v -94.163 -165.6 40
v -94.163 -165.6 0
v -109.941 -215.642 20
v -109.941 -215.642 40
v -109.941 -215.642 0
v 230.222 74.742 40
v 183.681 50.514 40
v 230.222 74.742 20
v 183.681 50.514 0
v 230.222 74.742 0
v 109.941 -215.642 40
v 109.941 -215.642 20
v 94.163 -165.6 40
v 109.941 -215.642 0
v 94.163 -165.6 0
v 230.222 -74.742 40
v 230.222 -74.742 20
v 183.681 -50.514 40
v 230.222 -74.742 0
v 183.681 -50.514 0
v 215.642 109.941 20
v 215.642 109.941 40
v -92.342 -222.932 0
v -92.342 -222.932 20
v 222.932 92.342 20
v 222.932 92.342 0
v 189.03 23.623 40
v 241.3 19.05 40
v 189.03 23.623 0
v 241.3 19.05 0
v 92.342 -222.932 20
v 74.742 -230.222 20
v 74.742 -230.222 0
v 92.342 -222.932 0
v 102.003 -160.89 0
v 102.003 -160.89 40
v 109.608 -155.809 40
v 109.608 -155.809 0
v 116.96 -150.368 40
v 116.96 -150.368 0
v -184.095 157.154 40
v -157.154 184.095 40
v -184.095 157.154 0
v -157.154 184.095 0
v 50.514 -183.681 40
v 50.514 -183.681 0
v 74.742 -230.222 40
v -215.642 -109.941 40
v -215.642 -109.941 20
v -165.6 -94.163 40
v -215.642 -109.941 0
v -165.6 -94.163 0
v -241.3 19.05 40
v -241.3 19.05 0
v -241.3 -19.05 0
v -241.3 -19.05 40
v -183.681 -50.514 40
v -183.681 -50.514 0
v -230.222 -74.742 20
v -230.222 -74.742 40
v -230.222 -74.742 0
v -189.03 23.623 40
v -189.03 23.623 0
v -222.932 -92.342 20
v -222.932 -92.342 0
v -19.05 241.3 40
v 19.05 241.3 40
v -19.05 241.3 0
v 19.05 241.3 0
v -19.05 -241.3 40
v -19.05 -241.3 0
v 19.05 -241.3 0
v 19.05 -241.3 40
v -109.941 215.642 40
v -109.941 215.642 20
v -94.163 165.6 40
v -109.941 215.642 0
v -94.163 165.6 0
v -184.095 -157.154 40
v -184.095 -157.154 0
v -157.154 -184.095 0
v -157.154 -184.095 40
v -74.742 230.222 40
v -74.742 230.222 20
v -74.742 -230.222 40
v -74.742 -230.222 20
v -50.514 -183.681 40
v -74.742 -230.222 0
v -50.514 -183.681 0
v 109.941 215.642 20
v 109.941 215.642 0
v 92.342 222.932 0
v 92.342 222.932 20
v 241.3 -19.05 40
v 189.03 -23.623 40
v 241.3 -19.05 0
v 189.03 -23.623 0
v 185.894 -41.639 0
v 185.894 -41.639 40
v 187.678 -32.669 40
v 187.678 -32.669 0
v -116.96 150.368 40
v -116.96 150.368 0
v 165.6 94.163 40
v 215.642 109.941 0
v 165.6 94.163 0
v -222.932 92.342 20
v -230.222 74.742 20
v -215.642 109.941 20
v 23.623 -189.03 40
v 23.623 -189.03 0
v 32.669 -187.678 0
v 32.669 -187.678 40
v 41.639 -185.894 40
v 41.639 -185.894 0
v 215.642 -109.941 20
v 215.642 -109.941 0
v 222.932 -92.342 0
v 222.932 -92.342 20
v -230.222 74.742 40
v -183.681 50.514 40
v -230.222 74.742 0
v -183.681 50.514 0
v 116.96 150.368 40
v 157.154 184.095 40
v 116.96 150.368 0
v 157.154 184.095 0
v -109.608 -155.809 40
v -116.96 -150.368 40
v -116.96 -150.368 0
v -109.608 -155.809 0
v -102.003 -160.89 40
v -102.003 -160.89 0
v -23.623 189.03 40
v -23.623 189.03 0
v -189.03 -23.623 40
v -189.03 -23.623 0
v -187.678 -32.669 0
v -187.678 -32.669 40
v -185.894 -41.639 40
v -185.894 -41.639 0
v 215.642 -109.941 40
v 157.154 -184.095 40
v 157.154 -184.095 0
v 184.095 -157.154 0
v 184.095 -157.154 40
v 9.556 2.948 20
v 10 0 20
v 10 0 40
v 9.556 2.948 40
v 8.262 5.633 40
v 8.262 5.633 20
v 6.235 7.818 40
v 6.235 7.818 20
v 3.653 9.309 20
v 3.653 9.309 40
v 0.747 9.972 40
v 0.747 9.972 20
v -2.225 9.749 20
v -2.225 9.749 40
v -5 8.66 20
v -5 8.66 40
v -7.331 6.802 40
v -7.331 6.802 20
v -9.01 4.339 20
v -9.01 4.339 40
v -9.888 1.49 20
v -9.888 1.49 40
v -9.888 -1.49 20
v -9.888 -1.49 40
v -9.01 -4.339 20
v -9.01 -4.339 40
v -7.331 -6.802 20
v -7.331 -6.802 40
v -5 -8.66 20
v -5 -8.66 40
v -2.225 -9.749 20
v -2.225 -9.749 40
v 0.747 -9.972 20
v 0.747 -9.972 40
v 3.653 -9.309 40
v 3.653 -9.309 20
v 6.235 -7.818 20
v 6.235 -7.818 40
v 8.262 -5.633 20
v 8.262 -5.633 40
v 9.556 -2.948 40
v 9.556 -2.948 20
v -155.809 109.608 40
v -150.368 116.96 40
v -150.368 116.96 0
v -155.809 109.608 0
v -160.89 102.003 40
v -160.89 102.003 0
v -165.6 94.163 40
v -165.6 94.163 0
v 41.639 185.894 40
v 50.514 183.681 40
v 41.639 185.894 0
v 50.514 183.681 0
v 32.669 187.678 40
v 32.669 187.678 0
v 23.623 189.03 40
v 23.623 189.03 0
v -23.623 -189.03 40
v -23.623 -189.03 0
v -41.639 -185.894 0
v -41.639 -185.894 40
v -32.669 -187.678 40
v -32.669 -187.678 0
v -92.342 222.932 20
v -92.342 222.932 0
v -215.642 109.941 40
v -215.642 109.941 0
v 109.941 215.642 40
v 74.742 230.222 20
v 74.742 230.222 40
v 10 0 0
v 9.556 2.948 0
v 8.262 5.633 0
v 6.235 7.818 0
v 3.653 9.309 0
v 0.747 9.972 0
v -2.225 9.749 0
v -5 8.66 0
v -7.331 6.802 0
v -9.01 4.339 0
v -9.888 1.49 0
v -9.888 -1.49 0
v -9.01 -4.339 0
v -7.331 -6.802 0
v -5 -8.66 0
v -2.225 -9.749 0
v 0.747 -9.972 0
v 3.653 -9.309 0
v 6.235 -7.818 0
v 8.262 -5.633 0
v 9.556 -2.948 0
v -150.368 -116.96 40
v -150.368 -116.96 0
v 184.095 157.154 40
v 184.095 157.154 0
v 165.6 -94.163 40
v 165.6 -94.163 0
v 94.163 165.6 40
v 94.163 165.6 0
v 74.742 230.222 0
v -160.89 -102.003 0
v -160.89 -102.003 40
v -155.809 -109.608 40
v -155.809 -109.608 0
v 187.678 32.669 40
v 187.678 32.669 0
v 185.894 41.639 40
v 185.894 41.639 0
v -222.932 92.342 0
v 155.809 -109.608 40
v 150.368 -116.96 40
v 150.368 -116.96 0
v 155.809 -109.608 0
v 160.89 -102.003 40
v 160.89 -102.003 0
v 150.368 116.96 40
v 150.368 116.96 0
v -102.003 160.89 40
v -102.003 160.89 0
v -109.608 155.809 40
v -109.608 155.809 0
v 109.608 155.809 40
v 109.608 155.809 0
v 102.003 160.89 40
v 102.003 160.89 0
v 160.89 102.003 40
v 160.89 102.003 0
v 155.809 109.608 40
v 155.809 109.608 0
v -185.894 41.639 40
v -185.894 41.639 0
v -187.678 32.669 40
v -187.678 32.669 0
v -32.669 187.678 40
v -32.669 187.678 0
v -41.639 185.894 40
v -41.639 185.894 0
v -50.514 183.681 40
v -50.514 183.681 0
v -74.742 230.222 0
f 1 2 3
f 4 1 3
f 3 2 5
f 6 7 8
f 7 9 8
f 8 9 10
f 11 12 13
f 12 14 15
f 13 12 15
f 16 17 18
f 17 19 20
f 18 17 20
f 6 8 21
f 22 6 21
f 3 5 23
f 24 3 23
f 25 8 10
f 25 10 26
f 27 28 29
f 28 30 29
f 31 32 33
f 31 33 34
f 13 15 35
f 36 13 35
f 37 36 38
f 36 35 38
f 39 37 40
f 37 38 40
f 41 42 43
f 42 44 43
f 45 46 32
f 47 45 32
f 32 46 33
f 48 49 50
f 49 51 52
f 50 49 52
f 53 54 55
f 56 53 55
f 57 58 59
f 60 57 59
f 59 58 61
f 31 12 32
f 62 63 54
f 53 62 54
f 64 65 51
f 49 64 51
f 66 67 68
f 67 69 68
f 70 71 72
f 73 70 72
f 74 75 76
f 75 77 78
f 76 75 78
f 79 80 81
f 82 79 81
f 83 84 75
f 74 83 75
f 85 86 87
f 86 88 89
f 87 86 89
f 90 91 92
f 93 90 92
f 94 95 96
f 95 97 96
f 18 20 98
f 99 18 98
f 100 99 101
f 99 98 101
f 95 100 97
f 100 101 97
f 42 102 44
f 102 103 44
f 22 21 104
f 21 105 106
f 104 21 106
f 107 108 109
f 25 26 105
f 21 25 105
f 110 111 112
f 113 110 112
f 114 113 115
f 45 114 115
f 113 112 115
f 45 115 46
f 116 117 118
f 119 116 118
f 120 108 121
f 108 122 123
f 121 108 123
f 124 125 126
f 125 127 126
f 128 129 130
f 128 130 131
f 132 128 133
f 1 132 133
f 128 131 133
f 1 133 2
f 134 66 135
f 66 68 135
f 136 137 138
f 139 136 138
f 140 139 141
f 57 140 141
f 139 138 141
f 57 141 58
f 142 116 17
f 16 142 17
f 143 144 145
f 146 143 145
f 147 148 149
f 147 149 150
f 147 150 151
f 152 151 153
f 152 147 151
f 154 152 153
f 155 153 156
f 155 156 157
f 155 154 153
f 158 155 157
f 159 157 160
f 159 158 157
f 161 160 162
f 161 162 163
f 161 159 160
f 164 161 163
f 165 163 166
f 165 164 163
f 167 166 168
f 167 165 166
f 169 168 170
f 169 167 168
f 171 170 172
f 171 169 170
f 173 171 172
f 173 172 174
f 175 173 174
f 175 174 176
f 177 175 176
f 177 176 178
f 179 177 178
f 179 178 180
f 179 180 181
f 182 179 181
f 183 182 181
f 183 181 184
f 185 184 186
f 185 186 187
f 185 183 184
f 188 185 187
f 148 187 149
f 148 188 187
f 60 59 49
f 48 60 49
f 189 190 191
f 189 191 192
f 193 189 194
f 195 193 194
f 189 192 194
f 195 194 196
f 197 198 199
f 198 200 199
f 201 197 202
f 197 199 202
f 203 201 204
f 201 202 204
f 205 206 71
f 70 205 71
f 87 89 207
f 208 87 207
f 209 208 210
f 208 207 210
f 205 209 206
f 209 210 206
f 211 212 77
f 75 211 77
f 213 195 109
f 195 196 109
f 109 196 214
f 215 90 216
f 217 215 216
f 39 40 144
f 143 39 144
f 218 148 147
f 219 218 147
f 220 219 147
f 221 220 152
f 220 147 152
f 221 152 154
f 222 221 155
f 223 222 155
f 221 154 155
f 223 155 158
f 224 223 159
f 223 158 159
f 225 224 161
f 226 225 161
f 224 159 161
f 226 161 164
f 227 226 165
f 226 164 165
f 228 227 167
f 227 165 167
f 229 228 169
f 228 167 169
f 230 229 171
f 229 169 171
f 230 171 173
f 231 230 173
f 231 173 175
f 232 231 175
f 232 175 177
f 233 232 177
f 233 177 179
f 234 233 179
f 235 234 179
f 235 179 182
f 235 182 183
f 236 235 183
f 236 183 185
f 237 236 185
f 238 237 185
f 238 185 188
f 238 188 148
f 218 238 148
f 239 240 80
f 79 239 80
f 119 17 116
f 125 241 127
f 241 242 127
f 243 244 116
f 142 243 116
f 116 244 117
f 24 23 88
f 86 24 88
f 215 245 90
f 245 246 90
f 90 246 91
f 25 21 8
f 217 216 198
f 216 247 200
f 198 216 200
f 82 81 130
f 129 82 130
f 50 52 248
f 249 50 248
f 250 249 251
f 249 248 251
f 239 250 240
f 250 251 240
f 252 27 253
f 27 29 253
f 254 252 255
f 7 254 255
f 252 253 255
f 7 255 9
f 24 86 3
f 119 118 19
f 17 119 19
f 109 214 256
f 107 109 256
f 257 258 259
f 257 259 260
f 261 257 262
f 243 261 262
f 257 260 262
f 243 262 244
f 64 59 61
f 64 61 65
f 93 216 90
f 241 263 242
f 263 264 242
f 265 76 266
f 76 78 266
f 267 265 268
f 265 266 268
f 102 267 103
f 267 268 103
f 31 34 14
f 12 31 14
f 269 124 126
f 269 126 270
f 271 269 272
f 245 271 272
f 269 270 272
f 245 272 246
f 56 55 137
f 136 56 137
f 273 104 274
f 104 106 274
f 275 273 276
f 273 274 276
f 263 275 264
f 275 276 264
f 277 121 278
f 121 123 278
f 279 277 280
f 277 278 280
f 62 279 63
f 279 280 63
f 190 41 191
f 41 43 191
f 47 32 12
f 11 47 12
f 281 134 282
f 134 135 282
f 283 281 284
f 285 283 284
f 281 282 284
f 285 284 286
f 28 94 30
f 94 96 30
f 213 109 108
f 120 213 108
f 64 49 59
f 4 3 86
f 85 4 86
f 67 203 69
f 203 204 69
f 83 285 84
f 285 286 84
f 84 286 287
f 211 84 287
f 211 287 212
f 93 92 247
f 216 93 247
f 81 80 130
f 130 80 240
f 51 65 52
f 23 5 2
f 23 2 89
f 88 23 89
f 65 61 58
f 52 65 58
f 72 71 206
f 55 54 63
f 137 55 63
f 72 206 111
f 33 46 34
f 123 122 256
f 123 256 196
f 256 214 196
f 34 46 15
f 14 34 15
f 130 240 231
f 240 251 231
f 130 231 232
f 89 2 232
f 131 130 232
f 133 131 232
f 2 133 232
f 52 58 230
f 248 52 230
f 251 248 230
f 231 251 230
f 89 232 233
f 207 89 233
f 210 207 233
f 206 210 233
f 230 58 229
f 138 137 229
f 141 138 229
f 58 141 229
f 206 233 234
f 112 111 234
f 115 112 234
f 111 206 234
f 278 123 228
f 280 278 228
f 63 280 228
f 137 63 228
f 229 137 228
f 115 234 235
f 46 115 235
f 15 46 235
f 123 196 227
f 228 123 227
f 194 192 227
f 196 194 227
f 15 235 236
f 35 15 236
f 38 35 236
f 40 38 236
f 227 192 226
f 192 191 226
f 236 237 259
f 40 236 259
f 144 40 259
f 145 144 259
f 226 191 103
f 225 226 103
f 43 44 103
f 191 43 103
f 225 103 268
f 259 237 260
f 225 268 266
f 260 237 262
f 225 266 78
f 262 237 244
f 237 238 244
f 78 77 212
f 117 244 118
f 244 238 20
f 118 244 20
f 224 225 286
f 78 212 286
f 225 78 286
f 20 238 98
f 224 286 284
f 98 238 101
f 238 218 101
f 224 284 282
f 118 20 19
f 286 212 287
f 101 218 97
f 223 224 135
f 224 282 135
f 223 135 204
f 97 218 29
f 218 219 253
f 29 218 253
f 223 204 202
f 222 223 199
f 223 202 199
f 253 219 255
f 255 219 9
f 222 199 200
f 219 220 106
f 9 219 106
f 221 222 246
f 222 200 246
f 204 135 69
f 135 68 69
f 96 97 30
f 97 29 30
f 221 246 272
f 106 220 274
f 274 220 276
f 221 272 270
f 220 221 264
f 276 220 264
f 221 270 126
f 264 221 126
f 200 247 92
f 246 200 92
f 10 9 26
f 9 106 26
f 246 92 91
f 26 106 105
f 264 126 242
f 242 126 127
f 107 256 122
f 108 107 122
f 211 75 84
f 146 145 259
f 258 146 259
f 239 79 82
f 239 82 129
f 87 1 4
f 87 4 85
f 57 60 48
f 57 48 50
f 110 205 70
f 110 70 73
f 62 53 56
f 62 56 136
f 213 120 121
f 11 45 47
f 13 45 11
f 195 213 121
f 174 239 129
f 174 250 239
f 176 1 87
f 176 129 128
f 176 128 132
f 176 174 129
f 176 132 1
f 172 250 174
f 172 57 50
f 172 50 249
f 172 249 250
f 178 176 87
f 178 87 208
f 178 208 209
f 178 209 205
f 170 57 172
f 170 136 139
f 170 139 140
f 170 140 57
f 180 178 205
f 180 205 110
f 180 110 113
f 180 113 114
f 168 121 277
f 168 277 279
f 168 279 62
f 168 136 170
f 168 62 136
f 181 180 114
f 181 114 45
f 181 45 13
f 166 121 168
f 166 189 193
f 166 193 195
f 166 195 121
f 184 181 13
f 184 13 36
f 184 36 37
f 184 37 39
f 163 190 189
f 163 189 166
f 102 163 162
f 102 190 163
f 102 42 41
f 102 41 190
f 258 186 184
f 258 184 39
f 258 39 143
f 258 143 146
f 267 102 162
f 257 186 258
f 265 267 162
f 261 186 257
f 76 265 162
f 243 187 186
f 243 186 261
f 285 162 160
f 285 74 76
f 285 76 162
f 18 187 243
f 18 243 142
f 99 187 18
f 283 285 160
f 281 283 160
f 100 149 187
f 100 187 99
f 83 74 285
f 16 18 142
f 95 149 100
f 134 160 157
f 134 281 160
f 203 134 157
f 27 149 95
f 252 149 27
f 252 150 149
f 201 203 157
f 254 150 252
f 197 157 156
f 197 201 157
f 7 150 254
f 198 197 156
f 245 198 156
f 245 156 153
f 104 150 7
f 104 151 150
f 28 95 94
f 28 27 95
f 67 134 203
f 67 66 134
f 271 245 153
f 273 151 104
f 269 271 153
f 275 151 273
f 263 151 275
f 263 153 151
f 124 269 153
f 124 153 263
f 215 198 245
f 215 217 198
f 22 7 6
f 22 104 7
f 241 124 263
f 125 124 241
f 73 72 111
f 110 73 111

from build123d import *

# Parameters (mm, degrees)
F1_DEPTH  = 20
F2_R      = 10
F3_DEPTH  = 20.001
F1_FACE_R = 10
F4_DEPTH  = 20


with BuildPart() as f1:
    # F0 (on Top) → F1 (new body)
    with BuildSketch(Plane.XY):
        with BuildLine():
            ThreePointArc((189.029629, -23.623065), (190.132052, -11.83439), (190.5, 0))
            ThreePointArc((190.5, 0), (190.132052, 11.83439), (189.029629, 23.623065))
            ThreePointArc((189.029629, 23.623065), (186.839596, 37.164706), (183.680761, 50.513641))
            ThreePointArc((183.680761, 50.513641), (175.999051, 72.901194), (165.60045, 94.163374))
            ThreePointArc((165.60045, 94.163374), (158.394961, 105.836129), (150.368162, 116.960103))
            ThreePointArc((150.368162, 116.960103), (134.703842, 134.703842), (116.960103, 150.368162))
            ThreePointArc((116.960103, 150.368162), (105.836129, 158.394961), (94.163374, 165.60045))
            ThreePointArc((94.163374, 165.60045), (72.901194, 175.999051), (50.513641, 183.680761))
            ThreePointArc((50.513641, 183.680761), (37.164706, 186.839596), (23.623065, 189.029629))
            ThreePointArc((23.623065, 189.029629), (0, 190.5), (-23.623065, 189.029629))
            ThreePointArc((-23.623065, 189.029629), (-37.164706, 186.839596), (-50.513641, 183.680761))
            ThreePointArc((-50.513641, 183.680761), (-72.901194, 175.999051), (-94.163374, 165.60045))
            ThreePointArc((-94.163374, 165.60045), (-105.836129, 158.394961), (-116.960103, 150.368162))
            ThreePointArc((-116.960103, 150.368162), (-134.703842, 134.703842), (-150.368162, 116.960103))
            ThreePointArc((-150.368162, 116.960103), (-158.394961, 105.836129), (-165.60045, 94.163374))
            ThreePointArc((-165.60045, 94.163374), (-175.999051, 72.901194), (-183.680761, 50.513641))
            ThreePointArc((-183.680761, 50.513641), (-186.839596, 37.164706), (-189.029629, 23.623065))
            ThreePointArc((-189.029629, 23.623065), (-190.5, 0), (-189.029629, -23.623065))
            ThreePointArc((-189.029629, -23.623065), (-186.839596, -37.164706), (-183.680761, -50.513641))
            ThreePointArc((-183.680761, -50.513641), (-175.999051, -72.901194), (-165.60045, -94.163374))
            ThreePointArc((-165.60045, -94.163374), (-158.394961, -105.836129), (-150.368162, -116.960103))
            ThreePointArc((-150.368162, -116.960103), (-134.703842, -134.703842), (-116.960103, -150.368162))
            ThreePointArc((-116.960103, -150.368162), (-105.836129, -158.394961), (-94.163374, -165.60045))
            ThreePointArc((-94.163374, -165.60045), (-72.901194, -175.999051), (-50.513641, -183.680761))
            ThreePointArc((-50.513641, -183.680761), (-37.164706, -186.839596), (-23.623065, -189.029629))
            ThreePointArc((-23.623065, -189.029629), (0, -190.5), (23.623065, -189.029629))
            ThreePointArc((23.623065, -189.029629), (37.164706, -186.839596), (50.513641, -183.680761))
            ThreePointArc((50.513641, -183.680761), (72.901194, -175.999051), (94.163374, -165.60045))
            ThreePointArc((94.163374, -165.60045), (105.836129, -158.394961), (116.960103, -150.368162))
            ThreePointArc((116.960103, -150.368162), (134.703842, -134.703842), (150.368162, -116.960103))
            ThreePointArc((150.368162, -116.960103), (158.394961, -105.836129), (165.60045, -94.163374))
            ThreePointArc((165.60045, -94.163374), (175.999051, -72.901194), (183.680761, -50.513641))
            ThreePointArc((183.680761, -50.513641), (186.839596, -37.164706), (189.029629, -23.623065))
        make_face()
        with BuildLine():
            ThreePointArc((189.029629, 23.623065), (190.132052, 11.83439), (190.5, 0))
            ThreePointArc((190.5, 0), (190.132052, -11.83439), (189.029629, -23.623065))
            Line((189.029629, -23.623065), (241.3, -19.05))
            Line((241.3, -19.05), (241.3, 0))
            Line((241.3, 0), (241.3, 19.05))
            Line((241.3, 19.05), (189.029629, 23.623065))
        make_face()
        with BuildLine():
            ThreePointArc((165.60045, 94.163374), (175.999051, 72.901194), (183.680761, 50.513641))
            Line((183.680761, 50.513641), (230.222251, 74.741607))
            Line((230.222251, 74.741607), (222.932131, 92.341512))
            Line((222.932131, 92.341512), (215.642012, 109.941417))
            Line((215.642012, 109.941417), (165.60045, 94.163374))
        make_face()
        with BuildLine():
            Line((230.222251, -74.741607), (183.680761, -50.513641))
            ThreePointArc((183.680761, -50.513641), (175.999051, -72.901194), (165.60045, -94.163374))
            Line((165.60045, -94.163374), (215.642012, -109.941417))
            Line((215.642012, -109.941417), (222.932131, -92.341512))
            Line((222.932131, -92.341512), (230.222251, -74.741607))
        make_face()
        with BuildLine():
            ThreePointArc((116.960103, 150.368162), (134.703842, 134.703842), (150.368162, 116.960103))
            Line((150.368162, 116.960103), (184.09525, 157.154482))
            Line((184.09525, 157.154482), (170.624866, 170.624866))
            Line((170.624866, 170.624866), (157.154482, 184.09525))
            Line((157.154482, 184.09525), (116.960103, 150.368162))
        make_face()
        with BuildLine():
            Line((184.09525, -157.154482), (150.368162, -116.960103))
            ThreePointArc((150.368162, -116.960103), (134.703842, -134.703842), (116.960103, -150.368162))
            Line((116.960103, -150.368162), (157.154482, -184.09525))
            Line((157.154482, -184.09525), (170.624866, -170.624866))
            Line((170.624866, -170.624866), (184.09525, -157.154482))
        make_face()
        with BuildLine():
            ThreePointArc((50.513641, 183.680761), (72.901194, 175.999051), (94.163374, 165.60045))
            Line((94.163374, 165.60045), (109.941417, 215.642012))
            Line((109.941417, 215.642012), (92.341512, 222.932131))
            Line((92.341512, 222.932131), (74.741607, 230.222251))
            Line((74.741607, 230.222251), (50.513641, 183.680761))
        make_face()
        with BuildLine():
            Line((109.941417, -215.642012), (94.163374, -165.60045))
            ThreePointArc((94.163374, -165.60045), (72.901194, -175.999051), (50.513641, -183.680761))
            Line((50.513641, -183.680761), (74.741607, -230.222251))
            Line((74.741607, -230.222251), (92.341512, -222.932131))
            Line((92.341512, -222.932131), (109.941417, -215.642012))
        make_face()
        with BuildLine():
            ThreePointArc((-23.623065, 189.029629), (0, 190.5), (23.623065, 189.029629))
            Line((23.623065, 189.029629), (19.05, 241.3))
            Line((19.05, 241.3), (0, 241.3))
            Line((0, 241.3), (-19.05, 241.3))
            Line((-19.05, 241.3), (-23.623065, 189.029629))
        make_face()
        with BuildLine():
            Line((19.05, -241.3), (23.623065, -189.029629))
            ThreePointArc((23.623065, -189.029629), (0, -190.5), (-23.623065, -189.029629))
            Line((-23.623065, -189.029629), (-19.05, -241.3))
            Line((-19.05, -241.3), (0, -241.3))
            Line((0, -241.3), (19.05, -241.3))
        make_face()
        with BuildLine():
            ThreePointArc((-94.163374, 165.60045), (-72.901194, 175.999051), (-50.513641, 183.680761))
            Line((-50.513641, 183.680761), (-74.741607, 230.222251))
            Line((-74.741607, 230.222251), (-92.341512, 222.932131))
            Line((-92.341512, 222.932131), (-109.941417, 215.642012))
            Line((-109.941417, 215.642012), (-94.163374, 165.60045))
        make_face()
        with BuildLine():
            Line((-74.741607, -230.222251), (-50.513641, -183.680761))
            ThreePointArc((-50.513641, -183.680761), (-72.901194, -175.999051), (-94.163374, -165.60045))
            Line((-94.163374, -165.60045), (-109.941417, -215.642012))
            Line((-109.941417, -215.642012), (-92.341512, -222.932131))
            Line((-92.341512, -222.932131), (-74.741607, -230.222251))
        make_face()
        with BuildLine():
            ThreePointArc((-150.368162, 116.960103), (-134.703842, 134.703842), (-116.960103, 150.368162))
            Line((-116.960103, 150.368162), (-157.154482, 184.09525))
            Line((-157.154482, 184.09525), (-170.624866, 170.624866))
            Line((-170.624866, 170.624866), (-184.09525, 157.154482))
            Line((-184.09525, 157.154482), (-150.368162, 116.960103))
        make_face()
        with BuildLine():
            Line((-157.154482, -184.09525), (-116.960103, -150.368162))
            ThreePointArc((-116.960103, -150.368162), (-134.703842, -134.703842), (-150.368162, -116.960103))
            Line((-150.368162, -116.960103), (-184.09525, -157.154482))
            Line((-184.09525, -157.154482), (-170.624866, -170.624866))
            Line((-170.624866, -170.624866), (-157.154482, -184.09525))
        make_face()
        with BuildLine():
            ThreePointArc((-183.680761, 50.513641), (-175.999051, 72.901194), (-165.60045, 94.163374))
            Line((-165.60045, 94.163374), (-215.642012, 109.941417))
            Line((-215.642012, 109.941417), (-222.932131, 92.341512))
            Line((-222.932131, 92.341512), (-230.222251, 74.741607))
            Line((-230.222251, 74.741607), (-183.680761, 50.513641))
        make_face()
        with BuildLine():
            Line((-215.642012, -109.941417), (-165.60045, -94.163374))
            ThreePointArc((-165.60045, -94.163374), (-175.999051, -72.901194), (-183.680761, -50.513641))
            Line((-183.680761, -50.513641), (-230.222251, -74.741607))
            Line((-230.222251, -74.741607), (-222.932131, -92.341512))
            Line((-222.932131, -92.341512), (-215.642012, -109.941417))
        make_face()
        with BuildLine():
            ThreePointArc((-189.029629, -23.623065), (-190.5, 0), (-189.029629, 23.623065))
            Line((-189.029629, 23.623065), (-241.3, 19.05))
            Line((-241.3, 19.05), (-241.3, 0))
            Line((-241.3, 0), (-241.3, -19.05))
            Line((-241.3, -19.05), (-189.029629, -23.623065))
        make_face()
    extrude(amount=F1_DEPTH)

    # F2 (on face) → F3 (cut, through all)
    with BuildSketch(Plane.XY.offset(20)):
        Circle(F2_R)
    extrude(amount=-F3_DEPTH, mode=Mode.SUBTRACT)

    # F1_face (on face) → F4 (join)
    with BuildSketch(Plane.XY.offset(20)):
        with BuildLine():
            ThreePointArc((183.680761, -50.513641), (186.839596, -37.164706), (189.029629, -23.623065))
            Line((189.029629, -23.623065), (241.3, -19.05))
            Line((241.3, -19.05), (241.3, 19.05))
            Line((241.3, 19.05), (189.029629, 23.623065))
            ThreePointArc((189.029629, 23.623065), (186.839596, 37.164706), (183.680761, 50.513641))
            Line((183.680761, 50.513641), (230.222251, 74.741607))
            Line((230.222251, 74.741607), (215.642012, 109.941417))
            Line((215.642012, 109.941417), (165.60045, 94.163374))
            ThreePointArc((165.60045, 94.163374), (158.394961, 105.836129), (150.368162, 116.960103))
            Line((150.368162, 116.960103), (184.09525, 157.154482))
            Line((184.09525, 157.154482), (157.154482, 184.09525))
            Line((157.154482, 184.09525), (116.960103, 150.368162))
            ThreePointArc((116.960103, 150.368162), (105.836129, 158.394961), (94.163374, 165.60045))
            Line((94.163374, 165.60045), (109.941417, 215.642012))
            Line((109.941417, 215.642012), (74.741607, 230.222251))
            Line((74.741607, 230.222251), (50.513641, 183.680761))
            ThreePointArc((50.513641, 183.680761), (37.164706, 186.839596), (23.623065, 189.029629))
            Line((23.623065, 189.029629), (19.05, 241.3))
            Line((19.05, 241.3), (-19.05, 241.3))
            Line((-19.05, 241.3), (-23.623065, 189.029629))
            ThreePointArc((-23.623065, 189.029629), (-37.164706, 186.839596), (-50.513641, 183.680761))
            Line((-50.513641, 183.680761), (-74.741607, 230.222251))
            Line((-74.741607, 230.222251), (-109.941417, 215.642012))
            Line((-109.941417, 215.642012), (-94.163374, 165.60045))
            ThreePointArc((-94.163374, 165.60045), (-105.836129, 158.394961), (-116.960103, 150.368162))
            Line((-116.960103, 150.368162), (-157.154482, 184.09525))
            Line((-157.154482, 184.09525), (-184.09525, 157.154482))
            Line((-184.09525, 157.154482), (-150.368162, 116.960103))
            ThreePointArc((-150.368162, 116.960103), (-158.394961, 105.836129), (-165.60045, 94.163374))
            Line((-165.60045, 94.163374), (-215.642012, 109.941417))
            Line((-215.642012, 109.941417), (-230.222251, 74.741607))
            Line((-230.222251, 74.741607), (-183.680761, 50.513641))
            ThreePointArc((-183.680761, 50.513641), (-186.839596, 37.164706), (-189.029629, 23.623065))
            Line((-189.029629, 23.623065), (-241.3, 19.05))
            Line((-241.3, 19.05), (-241.3, -19.05))
            Line((-241.3, -19.05), (-189.029629, -23.623065))
            ThreePointArc((-189.029629, -23.623065), (-186.839596, -37.164706), (-183.680761, -50.513641))
            Line((-183.680761, -50.513641), (-230.222251, -74.741607))
            Line((-230.222251, -74.741607), (-215.642012, -109.941417))
            Line((-215.642012, -109.941417), (-165.60045, -94.163374))
            ThreePointArc((-165.60045, -94.163374), (-158.394961, -105.836129), (-150.368162, -116.960103))
            Line((-150.368162, -116.960103), (-184.09525, -157.154482))
            Line((-184.09525, -157.154482), (-157.154482, -184.09525))
            Line((-157.154482, -184.09525), (-116.960103, -150.368162))
            ThreePointArc((-116.960103, -150.368162), (-105.836129, -158.394961), (-94.163374, -165.60045))
            Line((-94.163374, -165.60045), (-109.941417, -215.642012))
            Line((-109.941417, -215.642012), (-74.741607, -230.222251))
            Line((-74.741607, -230.222251), (-50.513641, -183.680761))
            ThreePointArc((-50.513641, -183.680761), (-37.164706, -186.839596), (-23.623065, -189.029629))
            Line((-23.623065, -189.029629), (-19.05, -241.3))
            Line((-19.05, -241.3), (19.05, -241.3))
            Line((19.05, -241.3), (23.623065, -189.029629))
            ThreePointArc((23.623065, -189.029629), (37.164706, -186.839596), (50.513641, -183.680761))
            Line((50.513641, -183.680761), (74.741607, -230.222251))
            Line((74.741607, -230.222251), (109.941417, -215.642012))
            Line((109.941417, -215.642012), (94.163374, -165.60045))
            ThreePointArc((94.163374, -165.60045), (105.836129, -158.394961), (116.960103, -150.368162))
            Line((116.960103, -150.368162), (157.154482, -184.09525))
            Line((157.154482, -184.09525), (184.09525, -157.154482))
            Line((184.09525, -157.154482), (150.368162, -116.960103))
            ThreePointArc((150.368162, -116.960103), (158.394961, -105.836129), (165.60045, -94.163374))
            Line((165.60045, -94.163374), (215.642012, -109.941417))
            Line((215.642012, -109.941417), (230.222251, -74.741607))
            Line((230.222251, -74.741607), (183.680761, -50.513641))
        make_face()
        Circle(F1_FACE_R, mode=Mode.SUBTRACT)
    extrude(amount=F4_DEPTH)


solid = f1.part
